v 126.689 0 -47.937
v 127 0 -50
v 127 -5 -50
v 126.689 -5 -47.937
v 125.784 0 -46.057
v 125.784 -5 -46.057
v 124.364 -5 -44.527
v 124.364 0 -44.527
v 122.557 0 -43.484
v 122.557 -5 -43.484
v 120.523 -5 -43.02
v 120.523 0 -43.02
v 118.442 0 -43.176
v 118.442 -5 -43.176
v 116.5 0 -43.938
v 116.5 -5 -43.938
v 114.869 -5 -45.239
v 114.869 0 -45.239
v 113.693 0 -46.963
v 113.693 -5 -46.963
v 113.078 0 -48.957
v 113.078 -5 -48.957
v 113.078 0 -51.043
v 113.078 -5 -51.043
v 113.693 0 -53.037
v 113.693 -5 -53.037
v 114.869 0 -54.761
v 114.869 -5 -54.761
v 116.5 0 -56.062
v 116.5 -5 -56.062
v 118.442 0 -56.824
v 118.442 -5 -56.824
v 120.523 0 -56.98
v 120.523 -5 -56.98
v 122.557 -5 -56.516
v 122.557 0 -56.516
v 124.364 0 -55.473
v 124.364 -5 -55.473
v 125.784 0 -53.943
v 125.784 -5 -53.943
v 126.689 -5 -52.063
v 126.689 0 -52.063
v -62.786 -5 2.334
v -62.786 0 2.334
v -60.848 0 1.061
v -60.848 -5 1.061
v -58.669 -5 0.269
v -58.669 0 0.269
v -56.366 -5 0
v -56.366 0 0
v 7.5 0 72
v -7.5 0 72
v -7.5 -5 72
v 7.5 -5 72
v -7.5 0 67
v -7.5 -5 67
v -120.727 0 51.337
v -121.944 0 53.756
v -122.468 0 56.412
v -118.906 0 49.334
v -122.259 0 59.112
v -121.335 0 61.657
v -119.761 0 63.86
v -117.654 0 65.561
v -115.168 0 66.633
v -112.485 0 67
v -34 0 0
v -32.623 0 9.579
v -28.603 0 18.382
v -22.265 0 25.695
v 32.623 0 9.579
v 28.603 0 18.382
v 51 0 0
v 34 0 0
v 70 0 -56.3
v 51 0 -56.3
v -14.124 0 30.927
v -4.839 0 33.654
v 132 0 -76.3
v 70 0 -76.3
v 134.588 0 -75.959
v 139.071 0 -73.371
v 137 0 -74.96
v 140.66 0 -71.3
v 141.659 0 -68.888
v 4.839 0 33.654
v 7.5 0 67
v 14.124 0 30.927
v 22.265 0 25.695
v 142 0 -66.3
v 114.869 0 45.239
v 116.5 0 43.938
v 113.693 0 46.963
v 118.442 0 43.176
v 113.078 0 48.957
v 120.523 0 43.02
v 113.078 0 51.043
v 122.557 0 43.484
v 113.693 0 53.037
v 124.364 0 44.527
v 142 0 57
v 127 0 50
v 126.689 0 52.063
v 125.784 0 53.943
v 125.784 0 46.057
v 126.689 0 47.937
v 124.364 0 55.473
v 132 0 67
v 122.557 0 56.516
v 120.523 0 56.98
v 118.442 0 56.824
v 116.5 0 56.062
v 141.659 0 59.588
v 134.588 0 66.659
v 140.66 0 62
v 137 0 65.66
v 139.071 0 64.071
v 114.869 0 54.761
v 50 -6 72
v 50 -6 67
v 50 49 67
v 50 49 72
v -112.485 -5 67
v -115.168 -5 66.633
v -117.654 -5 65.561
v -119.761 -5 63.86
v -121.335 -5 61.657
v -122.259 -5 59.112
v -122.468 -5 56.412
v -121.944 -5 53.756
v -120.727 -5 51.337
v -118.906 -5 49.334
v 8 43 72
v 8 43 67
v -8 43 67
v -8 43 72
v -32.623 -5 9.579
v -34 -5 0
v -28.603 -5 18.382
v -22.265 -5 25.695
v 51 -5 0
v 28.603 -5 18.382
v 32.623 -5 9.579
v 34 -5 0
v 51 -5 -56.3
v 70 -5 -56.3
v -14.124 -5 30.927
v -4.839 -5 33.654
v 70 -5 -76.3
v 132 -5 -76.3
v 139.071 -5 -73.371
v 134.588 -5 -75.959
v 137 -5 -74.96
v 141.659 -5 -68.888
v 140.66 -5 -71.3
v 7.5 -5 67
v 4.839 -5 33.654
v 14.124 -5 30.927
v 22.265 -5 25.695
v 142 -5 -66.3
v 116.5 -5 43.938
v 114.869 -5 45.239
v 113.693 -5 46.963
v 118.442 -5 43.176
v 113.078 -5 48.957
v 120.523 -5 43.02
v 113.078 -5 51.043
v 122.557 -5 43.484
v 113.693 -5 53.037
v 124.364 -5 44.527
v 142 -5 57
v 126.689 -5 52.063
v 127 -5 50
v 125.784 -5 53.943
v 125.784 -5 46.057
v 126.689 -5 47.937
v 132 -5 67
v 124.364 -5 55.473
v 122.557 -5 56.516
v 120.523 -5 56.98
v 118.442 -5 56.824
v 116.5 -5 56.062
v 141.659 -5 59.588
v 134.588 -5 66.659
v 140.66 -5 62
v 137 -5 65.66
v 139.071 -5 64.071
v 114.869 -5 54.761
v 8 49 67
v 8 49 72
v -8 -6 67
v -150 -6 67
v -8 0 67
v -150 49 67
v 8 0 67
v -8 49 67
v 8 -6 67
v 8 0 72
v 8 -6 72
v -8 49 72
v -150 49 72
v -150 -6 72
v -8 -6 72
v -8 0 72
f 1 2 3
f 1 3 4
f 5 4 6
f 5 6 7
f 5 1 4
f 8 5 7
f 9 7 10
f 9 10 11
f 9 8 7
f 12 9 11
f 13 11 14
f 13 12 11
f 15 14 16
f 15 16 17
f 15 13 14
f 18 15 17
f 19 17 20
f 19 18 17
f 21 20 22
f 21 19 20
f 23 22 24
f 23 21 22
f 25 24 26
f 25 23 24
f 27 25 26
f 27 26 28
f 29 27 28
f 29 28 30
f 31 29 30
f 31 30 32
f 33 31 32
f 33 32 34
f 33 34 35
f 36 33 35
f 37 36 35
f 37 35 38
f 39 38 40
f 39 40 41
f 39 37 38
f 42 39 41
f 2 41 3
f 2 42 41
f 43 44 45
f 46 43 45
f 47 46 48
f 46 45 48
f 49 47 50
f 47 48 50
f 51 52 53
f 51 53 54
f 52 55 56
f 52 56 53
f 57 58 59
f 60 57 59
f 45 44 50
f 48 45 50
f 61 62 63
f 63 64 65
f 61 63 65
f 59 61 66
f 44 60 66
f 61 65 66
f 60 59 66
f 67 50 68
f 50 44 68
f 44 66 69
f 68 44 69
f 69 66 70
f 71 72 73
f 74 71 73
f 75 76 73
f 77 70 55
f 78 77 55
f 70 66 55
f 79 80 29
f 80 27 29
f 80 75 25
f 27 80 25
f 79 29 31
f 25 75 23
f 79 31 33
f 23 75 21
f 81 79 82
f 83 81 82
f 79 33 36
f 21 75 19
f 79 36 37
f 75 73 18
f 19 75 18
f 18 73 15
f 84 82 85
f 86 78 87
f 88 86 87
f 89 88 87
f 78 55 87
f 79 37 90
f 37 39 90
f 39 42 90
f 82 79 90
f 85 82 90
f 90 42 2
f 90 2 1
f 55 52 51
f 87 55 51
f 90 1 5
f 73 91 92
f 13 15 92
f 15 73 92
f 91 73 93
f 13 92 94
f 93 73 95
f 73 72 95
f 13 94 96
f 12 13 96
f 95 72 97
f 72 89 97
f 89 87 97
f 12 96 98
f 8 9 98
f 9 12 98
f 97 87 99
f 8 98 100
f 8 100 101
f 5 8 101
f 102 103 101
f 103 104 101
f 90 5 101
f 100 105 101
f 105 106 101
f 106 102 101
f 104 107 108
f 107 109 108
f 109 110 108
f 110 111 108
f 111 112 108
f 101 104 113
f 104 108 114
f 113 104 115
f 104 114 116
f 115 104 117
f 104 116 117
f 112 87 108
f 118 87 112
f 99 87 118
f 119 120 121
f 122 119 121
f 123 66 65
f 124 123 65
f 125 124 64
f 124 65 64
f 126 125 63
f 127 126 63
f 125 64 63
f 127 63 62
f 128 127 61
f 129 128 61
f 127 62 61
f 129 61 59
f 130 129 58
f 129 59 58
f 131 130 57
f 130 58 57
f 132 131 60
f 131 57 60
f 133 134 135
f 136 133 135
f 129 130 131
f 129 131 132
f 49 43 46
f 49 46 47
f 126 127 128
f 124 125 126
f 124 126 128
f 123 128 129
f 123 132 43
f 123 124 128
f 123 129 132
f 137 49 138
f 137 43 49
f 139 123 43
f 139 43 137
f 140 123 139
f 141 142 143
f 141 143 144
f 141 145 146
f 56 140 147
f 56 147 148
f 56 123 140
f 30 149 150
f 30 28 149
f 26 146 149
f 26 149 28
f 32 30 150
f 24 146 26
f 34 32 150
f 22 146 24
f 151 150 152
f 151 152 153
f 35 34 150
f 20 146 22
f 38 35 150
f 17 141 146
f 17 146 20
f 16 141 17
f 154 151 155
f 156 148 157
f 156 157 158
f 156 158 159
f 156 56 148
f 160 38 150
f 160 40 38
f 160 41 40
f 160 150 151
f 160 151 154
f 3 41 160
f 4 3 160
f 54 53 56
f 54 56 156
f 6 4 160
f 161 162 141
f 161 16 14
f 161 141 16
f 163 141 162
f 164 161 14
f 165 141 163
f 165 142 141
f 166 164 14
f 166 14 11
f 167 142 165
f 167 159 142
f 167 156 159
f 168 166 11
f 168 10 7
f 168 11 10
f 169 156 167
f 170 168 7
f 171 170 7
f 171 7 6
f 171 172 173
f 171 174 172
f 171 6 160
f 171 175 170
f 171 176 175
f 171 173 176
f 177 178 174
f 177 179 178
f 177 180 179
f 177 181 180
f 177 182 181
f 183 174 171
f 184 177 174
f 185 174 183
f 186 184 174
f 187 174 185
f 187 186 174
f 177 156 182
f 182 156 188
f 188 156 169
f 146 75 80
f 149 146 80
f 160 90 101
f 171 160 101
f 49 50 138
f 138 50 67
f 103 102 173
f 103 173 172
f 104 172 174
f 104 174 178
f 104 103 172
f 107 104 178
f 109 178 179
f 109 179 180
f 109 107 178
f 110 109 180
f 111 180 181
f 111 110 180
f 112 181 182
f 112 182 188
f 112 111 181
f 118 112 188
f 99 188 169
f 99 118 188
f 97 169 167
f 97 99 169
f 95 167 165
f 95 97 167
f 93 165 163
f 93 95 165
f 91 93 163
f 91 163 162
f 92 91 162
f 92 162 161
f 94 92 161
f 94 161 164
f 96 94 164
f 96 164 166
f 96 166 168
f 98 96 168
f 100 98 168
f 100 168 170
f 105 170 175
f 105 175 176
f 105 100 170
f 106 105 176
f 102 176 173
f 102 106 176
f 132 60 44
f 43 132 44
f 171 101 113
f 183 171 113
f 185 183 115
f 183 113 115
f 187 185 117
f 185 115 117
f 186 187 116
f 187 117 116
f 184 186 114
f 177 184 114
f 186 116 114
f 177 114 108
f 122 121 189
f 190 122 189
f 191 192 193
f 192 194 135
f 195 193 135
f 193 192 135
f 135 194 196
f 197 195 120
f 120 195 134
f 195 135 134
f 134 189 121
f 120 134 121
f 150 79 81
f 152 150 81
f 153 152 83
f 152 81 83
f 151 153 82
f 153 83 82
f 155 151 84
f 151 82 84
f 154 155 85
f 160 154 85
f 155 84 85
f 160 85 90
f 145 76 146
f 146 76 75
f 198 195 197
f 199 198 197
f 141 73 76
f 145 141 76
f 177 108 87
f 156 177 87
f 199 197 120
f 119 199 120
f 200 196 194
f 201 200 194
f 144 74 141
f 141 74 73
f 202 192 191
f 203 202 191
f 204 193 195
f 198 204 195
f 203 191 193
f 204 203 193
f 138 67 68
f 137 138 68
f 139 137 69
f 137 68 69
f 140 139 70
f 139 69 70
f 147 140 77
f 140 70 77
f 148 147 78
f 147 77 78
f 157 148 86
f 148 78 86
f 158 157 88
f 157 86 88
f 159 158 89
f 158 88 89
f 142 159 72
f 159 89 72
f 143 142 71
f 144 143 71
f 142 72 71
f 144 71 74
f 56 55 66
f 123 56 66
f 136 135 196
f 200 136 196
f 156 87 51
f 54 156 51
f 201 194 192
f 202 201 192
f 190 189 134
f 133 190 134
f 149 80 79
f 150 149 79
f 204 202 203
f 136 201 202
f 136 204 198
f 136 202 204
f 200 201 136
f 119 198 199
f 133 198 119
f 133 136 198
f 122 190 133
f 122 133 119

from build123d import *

# Parameters (mm, degrees)
F0_R     = 7
F0_W     = 15
F0_H     = 5
F1_DEPTH = 5
F3_DEPTH = 5


with BuildPart() as f1:
    # F0 (on Front) → F1 (new body)
    with BuildSketch(Plane.XZ):
        with BuildLine():
            Line((-7.5, 67), (-112.485019, 67))
            ThreePointArc((-112.485019, 67), (-121.883551, 60.415787), (-118.905696, 49.33352))
            Line((-118.905696, 49.33352), (-62.786293, 2.33352))
            ThreePointArc((-62.786293, 2.33352), (-59.781403, 0.601468), (-56.365616, 0))
            Line((-56.365616, 0), (-34, 0))
            ThreePointArc((-34, 0), (0, 34), (34, 0))
            Line((34, 0), (51, 0))
            Line((51, 0), (51, -56.3))
            Line((51, -56.3), (70, -56.3))
            Line((70, -56.3), (70, -76.3))
            Line((70, -76.3), (132, -76.3))
            ThreePointArc((132, -76.3), (139.071068, -73.371068), (142, -66.3))
            Line((142, -66.3), (142, 57))
            ThreePointArc((142, 57), (139.071068, 64.071068), (132, 67))
            Line((132, 67), (7.5, 67))
            Line((7.5, 67), (-7.5, 67))
        make_face()
        with Locations((120, -50)):
            Circle(F0_R, mode=Mode.SUBTRACT)
        with Locations((120, 50)):
            Circle(F0_R, mode=Mode.SUBTRACT)
        with Locations((0, 69.5)):
            Rectangle(F0_W, F0_H)
    extrude(amount=F1_DEPTH)


with BuildPart() as f3:
    # F2 (on face) → F3 (new body)
    with BuildSketch(Plane.XY.offset(67)):
        Polygon((8, -6), (50, -6), (50, 49), (8, 49), (8, 43), (-8, 43), (-8, 49), (-150, 49), (-150, -6), (-8, -6), (-8, 0), (8, 0), align=None)
    extrude(amount=F3_DEPTH)


solid = Compound([f1.part, f3.part])
